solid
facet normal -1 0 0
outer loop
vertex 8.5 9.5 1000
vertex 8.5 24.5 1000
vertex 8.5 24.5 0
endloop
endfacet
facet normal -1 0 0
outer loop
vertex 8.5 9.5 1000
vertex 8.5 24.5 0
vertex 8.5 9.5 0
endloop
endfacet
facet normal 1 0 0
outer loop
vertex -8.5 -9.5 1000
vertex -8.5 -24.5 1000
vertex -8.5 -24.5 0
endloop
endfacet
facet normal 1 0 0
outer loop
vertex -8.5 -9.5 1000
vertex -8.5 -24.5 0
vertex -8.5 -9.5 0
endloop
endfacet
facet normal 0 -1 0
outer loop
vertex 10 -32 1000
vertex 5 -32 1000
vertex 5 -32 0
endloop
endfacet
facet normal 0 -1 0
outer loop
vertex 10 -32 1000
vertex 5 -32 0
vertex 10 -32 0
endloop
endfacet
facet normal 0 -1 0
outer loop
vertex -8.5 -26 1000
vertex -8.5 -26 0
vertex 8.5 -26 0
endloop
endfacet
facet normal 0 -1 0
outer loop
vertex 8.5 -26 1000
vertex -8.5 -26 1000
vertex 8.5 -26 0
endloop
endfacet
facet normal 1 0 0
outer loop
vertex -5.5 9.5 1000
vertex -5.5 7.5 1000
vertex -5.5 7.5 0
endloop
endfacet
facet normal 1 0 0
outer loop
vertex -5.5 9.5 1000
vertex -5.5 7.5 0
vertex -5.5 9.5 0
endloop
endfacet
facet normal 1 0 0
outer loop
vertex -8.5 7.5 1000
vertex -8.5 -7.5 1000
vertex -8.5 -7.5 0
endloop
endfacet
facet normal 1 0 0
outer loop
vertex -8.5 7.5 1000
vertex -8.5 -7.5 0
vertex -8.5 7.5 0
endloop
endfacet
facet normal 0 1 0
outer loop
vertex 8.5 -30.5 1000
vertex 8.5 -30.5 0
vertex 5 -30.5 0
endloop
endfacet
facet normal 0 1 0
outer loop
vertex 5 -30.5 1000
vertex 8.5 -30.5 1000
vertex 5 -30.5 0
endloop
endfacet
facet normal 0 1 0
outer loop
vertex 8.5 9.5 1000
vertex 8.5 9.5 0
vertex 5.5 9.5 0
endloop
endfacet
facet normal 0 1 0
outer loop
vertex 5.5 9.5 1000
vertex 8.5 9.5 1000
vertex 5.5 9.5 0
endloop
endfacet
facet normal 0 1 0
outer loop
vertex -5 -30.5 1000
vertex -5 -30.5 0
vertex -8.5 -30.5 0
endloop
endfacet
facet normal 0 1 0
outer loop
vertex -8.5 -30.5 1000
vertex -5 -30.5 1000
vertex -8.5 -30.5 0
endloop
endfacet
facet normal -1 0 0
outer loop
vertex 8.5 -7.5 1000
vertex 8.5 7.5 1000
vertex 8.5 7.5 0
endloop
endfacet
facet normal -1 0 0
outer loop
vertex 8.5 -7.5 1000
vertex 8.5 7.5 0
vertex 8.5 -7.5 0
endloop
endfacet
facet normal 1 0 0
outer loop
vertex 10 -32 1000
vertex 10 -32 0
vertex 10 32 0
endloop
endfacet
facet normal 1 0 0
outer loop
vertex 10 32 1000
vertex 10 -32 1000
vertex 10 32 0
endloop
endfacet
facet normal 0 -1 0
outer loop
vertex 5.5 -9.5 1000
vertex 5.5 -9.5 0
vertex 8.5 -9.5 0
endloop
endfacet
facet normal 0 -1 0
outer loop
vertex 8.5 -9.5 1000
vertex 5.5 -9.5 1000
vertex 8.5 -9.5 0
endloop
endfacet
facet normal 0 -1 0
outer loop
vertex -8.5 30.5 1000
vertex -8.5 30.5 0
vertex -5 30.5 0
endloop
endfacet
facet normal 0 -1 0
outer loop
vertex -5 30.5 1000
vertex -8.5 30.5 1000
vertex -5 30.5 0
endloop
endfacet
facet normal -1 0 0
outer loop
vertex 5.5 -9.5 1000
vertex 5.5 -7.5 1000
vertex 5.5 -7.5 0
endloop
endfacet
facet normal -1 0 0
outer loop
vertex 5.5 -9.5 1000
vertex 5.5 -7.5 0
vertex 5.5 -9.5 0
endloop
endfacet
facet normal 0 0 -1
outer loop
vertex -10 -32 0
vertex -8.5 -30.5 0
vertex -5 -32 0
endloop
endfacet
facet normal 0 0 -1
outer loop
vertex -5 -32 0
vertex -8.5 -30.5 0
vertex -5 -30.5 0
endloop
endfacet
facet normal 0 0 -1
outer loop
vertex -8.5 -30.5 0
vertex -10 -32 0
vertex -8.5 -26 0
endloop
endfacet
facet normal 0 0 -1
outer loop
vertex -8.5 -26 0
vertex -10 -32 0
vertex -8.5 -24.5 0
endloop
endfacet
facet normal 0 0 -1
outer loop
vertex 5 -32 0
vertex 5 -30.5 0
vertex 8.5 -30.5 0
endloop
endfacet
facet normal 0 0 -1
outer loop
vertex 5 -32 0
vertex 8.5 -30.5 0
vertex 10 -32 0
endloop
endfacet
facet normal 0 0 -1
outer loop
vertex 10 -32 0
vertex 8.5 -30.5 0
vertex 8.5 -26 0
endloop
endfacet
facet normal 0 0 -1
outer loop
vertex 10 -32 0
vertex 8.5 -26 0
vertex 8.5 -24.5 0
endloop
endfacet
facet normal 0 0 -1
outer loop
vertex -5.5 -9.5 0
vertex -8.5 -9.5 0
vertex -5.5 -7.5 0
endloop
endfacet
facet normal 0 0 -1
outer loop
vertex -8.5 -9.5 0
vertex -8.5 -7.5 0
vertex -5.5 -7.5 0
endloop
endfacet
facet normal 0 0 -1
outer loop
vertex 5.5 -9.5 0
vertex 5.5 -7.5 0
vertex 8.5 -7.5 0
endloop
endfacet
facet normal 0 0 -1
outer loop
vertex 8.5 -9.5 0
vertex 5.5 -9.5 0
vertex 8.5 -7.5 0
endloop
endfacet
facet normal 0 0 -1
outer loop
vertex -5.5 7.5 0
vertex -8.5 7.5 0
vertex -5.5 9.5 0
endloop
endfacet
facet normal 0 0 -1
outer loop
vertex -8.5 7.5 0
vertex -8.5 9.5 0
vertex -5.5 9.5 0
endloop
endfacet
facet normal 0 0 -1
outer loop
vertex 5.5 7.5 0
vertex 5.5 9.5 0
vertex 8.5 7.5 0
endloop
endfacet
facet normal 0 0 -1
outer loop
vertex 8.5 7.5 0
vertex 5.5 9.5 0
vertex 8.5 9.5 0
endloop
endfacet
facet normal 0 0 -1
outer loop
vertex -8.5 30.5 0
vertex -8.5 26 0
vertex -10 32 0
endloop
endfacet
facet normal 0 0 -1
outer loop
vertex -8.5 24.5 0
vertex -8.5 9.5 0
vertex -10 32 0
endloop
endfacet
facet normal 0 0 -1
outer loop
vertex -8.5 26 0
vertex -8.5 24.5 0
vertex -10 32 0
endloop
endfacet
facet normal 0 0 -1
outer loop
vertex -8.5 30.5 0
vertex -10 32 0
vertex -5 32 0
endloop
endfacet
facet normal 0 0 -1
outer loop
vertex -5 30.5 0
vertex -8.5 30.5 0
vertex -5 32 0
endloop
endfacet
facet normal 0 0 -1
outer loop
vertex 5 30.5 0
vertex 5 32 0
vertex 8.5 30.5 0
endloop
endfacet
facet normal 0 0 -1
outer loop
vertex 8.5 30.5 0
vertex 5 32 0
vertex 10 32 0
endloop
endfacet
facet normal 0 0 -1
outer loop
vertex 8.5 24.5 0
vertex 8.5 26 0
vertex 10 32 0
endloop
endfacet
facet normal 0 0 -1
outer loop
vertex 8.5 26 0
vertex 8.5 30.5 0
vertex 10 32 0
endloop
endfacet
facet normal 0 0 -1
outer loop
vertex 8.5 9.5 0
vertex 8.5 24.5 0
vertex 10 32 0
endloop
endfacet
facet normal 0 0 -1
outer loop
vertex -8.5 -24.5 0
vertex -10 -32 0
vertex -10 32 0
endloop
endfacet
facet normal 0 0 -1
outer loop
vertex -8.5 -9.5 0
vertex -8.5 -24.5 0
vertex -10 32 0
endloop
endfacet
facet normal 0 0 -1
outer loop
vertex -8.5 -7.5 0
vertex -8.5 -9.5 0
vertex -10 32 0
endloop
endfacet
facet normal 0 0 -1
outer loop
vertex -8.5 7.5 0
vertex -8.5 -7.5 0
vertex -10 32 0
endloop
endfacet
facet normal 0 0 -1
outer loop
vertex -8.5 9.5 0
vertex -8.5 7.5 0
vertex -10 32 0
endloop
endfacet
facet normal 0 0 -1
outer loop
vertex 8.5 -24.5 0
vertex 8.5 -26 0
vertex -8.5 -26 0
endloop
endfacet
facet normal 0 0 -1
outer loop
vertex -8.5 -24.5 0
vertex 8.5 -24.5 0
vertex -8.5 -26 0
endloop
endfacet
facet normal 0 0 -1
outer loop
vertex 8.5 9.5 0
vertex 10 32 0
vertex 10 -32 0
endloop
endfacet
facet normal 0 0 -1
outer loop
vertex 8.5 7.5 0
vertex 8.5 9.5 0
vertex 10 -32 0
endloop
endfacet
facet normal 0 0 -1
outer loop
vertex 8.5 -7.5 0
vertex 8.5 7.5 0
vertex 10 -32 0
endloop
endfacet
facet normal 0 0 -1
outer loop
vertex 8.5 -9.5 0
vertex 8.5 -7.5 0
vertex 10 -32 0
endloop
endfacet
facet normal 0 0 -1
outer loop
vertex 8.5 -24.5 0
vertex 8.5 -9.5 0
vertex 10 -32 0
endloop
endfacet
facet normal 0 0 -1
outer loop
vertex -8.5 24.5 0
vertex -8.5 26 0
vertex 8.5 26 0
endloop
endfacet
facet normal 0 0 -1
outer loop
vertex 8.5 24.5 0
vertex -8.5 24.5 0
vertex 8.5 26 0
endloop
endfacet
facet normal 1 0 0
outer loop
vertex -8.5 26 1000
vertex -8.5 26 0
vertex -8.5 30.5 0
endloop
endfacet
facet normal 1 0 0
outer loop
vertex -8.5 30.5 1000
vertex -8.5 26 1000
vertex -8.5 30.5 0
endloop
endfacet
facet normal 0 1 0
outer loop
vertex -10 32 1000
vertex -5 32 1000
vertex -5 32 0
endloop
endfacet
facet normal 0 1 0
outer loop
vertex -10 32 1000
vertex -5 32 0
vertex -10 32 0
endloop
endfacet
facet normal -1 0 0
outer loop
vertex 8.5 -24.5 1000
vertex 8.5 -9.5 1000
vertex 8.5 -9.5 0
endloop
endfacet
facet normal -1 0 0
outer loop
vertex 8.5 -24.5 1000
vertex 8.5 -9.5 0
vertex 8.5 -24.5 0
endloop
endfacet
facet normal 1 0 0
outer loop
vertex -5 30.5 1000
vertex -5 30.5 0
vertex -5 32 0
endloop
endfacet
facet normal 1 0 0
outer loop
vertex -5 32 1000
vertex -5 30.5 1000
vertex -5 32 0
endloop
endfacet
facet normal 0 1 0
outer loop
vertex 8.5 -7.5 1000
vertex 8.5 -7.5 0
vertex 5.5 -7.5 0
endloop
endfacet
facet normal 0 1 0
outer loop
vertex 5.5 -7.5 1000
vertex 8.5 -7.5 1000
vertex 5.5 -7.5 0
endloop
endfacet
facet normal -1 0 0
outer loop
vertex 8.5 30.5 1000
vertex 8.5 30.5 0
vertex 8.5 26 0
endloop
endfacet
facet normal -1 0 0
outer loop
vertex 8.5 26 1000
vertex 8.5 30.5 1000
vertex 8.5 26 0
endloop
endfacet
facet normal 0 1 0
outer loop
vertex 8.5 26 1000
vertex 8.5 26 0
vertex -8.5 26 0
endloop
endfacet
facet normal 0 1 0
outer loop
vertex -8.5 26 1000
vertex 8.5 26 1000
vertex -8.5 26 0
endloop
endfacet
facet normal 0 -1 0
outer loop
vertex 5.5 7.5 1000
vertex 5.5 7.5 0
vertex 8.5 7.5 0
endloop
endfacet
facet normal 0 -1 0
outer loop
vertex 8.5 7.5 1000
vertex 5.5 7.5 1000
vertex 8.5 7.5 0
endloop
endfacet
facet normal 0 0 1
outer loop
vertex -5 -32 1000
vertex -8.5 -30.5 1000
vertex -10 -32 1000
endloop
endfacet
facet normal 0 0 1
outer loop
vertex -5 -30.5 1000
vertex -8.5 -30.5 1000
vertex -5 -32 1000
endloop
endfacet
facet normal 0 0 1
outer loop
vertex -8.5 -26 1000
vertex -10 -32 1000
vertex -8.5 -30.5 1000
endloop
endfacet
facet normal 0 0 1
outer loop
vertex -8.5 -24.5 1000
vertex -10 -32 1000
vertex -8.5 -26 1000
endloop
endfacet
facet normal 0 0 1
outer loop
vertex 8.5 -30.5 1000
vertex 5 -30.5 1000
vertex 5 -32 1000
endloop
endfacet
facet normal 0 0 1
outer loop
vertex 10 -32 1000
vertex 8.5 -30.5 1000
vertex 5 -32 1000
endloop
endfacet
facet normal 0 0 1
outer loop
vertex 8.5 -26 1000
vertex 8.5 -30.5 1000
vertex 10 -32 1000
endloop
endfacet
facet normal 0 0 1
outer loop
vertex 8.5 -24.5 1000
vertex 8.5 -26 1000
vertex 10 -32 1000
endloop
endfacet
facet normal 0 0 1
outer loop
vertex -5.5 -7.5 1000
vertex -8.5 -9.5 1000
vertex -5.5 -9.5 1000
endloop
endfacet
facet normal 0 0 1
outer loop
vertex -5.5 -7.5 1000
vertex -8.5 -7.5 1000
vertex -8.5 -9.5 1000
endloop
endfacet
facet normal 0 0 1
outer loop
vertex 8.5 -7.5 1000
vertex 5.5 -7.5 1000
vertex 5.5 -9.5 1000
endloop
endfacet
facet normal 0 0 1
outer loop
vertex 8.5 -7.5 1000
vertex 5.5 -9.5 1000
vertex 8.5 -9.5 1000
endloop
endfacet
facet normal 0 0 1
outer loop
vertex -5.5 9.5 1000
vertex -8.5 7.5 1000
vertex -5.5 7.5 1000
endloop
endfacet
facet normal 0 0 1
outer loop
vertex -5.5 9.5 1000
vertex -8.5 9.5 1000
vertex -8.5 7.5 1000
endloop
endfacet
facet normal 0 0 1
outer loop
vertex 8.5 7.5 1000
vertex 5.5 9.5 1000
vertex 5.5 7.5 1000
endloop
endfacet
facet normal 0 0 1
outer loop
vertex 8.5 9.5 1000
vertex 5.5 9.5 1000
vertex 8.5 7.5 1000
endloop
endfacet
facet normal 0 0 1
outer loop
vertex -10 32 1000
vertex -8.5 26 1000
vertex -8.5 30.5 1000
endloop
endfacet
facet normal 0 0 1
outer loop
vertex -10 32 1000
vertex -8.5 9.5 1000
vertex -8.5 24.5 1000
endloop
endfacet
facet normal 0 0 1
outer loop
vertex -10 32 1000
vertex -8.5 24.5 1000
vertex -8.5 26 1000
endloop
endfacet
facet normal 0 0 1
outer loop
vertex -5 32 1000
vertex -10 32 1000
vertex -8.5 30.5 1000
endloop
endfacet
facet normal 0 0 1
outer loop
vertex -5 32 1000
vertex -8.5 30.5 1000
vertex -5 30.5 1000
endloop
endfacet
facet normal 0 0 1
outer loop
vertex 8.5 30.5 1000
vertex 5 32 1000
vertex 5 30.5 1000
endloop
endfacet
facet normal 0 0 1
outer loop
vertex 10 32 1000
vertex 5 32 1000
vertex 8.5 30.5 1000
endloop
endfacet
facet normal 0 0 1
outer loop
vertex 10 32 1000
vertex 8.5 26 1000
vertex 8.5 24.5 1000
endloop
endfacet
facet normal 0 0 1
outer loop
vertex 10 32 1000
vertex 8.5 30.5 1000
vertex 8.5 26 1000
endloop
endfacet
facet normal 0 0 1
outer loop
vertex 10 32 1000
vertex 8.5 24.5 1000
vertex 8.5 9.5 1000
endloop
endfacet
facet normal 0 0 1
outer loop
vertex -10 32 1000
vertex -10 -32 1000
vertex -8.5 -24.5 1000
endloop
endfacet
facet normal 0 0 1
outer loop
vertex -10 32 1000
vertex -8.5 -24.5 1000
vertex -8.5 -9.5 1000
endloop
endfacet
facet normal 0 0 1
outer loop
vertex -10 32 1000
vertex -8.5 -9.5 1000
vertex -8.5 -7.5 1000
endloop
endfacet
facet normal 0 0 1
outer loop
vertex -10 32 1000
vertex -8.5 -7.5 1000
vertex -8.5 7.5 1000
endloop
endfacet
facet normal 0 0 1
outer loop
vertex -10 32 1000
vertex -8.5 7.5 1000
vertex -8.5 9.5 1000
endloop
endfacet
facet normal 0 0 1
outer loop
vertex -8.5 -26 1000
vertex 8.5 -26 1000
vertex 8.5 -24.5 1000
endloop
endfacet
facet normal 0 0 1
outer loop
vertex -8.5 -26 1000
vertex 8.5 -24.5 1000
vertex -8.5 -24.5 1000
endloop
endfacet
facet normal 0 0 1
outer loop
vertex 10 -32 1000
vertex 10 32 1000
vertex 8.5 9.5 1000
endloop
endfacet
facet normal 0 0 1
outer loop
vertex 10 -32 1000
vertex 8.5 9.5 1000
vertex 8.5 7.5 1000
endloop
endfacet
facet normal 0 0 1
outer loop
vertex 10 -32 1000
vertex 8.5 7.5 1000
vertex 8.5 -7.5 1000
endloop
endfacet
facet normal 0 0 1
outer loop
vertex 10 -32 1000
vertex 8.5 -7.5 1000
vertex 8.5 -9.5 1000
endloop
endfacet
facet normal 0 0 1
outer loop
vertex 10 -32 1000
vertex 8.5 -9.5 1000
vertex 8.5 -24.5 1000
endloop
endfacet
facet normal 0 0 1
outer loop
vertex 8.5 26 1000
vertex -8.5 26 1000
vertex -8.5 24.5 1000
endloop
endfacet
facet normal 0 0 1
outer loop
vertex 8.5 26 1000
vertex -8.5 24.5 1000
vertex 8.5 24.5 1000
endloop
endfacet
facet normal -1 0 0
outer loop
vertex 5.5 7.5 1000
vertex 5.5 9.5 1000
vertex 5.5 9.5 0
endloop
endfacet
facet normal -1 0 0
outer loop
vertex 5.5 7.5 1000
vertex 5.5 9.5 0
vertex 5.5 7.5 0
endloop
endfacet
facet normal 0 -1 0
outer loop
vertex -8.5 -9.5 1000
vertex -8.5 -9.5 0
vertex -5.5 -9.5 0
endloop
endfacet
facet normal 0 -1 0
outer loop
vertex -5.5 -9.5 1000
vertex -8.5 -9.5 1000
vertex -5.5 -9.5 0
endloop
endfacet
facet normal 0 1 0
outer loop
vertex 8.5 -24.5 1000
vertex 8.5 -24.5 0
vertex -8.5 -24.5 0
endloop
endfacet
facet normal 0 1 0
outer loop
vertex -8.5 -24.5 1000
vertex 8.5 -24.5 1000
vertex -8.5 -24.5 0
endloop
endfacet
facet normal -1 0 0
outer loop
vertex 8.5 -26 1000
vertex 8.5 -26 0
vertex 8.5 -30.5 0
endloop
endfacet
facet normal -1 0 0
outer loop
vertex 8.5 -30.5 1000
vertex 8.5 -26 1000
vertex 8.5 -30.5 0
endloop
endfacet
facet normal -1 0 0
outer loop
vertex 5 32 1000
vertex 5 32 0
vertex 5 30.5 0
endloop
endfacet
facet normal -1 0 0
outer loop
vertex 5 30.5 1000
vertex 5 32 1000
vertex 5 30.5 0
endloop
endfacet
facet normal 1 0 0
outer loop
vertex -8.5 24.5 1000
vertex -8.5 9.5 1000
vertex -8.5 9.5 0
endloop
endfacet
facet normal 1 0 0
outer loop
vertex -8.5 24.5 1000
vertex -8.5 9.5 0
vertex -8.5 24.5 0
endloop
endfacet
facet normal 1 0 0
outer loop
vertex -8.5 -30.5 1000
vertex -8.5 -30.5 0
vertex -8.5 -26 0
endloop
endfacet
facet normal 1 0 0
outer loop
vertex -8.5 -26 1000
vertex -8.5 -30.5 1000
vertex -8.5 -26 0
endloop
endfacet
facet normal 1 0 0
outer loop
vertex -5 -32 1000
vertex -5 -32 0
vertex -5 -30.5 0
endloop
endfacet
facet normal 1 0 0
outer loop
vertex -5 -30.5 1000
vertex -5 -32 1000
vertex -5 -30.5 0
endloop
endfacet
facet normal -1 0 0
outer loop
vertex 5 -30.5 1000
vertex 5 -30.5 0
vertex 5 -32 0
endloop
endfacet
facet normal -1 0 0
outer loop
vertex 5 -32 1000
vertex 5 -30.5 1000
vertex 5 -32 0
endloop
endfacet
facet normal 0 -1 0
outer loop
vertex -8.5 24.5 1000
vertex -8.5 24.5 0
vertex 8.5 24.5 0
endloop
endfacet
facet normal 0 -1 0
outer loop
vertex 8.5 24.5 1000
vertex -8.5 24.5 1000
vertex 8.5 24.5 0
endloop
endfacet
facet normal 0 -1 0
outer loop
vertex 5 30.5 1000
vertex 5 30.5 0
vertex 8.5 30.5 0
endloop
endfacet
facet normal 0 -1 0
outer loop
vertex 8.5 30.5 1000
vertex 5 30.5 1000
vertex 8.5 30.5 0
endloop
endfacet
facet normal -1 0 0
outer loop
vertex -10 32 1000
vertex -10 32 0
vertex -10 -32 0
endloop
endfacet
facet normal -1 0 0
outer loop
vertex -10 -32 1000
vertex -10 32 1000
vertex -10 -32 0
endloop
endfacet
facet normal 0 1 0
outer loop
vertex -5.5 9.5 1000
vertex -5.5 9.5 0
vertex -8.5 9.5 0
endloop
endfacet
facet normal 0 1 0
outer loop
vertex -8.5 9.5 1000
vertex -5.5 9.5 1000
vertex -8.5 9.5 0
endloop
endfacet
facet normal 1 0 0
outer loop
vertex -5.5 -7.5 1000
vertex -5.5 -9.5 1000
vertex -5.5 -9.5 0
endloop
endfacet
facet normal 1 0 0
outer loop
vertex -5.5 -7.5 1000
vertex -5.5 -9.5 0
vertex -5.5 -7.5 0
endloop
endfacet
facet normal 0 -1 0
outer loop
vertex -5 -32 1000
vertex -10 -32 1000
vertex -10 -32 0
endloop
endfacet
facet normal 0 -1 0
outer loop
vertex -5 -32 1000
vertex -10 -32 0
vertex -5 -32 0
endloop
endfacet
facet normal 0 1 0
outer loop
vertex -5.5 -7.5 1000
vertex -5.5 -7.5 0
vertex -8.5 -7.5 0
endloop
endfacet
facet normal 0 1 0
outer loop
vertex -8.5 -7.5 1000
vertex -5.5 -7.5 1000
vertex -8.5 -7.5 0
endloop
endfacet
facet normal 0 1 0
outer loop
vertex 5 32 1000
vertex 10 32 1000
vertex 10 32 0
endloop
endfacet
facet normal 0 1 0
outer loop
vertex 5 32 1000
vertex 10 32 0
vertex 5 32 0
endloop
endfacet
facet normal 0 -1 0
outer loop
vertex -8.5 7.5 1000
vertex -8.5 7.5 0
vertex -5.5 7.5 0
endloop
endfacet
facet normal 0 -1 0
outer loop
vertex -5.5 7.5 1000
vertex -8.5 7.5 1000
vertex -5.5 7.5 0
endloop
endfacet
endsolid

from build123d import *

# Parameters (mm, degrees)
F1_DEPTH = 1000


with BuildPart() as f1:
    # F0 (on Top) → F1 (new body)
    with BuildSketch(Plane.XY):
        Polygon((-5, 30.5), (-5, 32), (-10, 32), (-10, -32), (-5, -32), (-5, -30.5), (-8.5, -30.5), (-8.5, -26), (8.5, -26), (8.5, -30.5), (5, -30.5), (5, -32), (10, -32), (10, 32), (5, 32), (5, 30.5), (8.5, 30.5), (8.5, 26), (-8.5, 26), (-8.5, 30.5), align=None)
        Polygon((-8.5, 9.5), (-8.5, 24.5), (8.5, 24.5), (8.5, 9.5), (5.5, 9.5), (5.5, 7.5), (8.5, 7.5), (8.5, -7.5), (5.5, -7.5), (5.5, -9.5), (8.5, -9.5), (8.5, -24.5), (-8.5, -24.5), (-8.5, -9.5), (-5.5, -9.5), (-5.5, -7.5), (-8.5, -7.5), (-8.5, 7.5), (-5.5, 7.5), (-5.5, 9.5), align=None, mode=Mode.SUBTRACT)
    extrude(amount=F1_DEPTH)


solid = f1.part
